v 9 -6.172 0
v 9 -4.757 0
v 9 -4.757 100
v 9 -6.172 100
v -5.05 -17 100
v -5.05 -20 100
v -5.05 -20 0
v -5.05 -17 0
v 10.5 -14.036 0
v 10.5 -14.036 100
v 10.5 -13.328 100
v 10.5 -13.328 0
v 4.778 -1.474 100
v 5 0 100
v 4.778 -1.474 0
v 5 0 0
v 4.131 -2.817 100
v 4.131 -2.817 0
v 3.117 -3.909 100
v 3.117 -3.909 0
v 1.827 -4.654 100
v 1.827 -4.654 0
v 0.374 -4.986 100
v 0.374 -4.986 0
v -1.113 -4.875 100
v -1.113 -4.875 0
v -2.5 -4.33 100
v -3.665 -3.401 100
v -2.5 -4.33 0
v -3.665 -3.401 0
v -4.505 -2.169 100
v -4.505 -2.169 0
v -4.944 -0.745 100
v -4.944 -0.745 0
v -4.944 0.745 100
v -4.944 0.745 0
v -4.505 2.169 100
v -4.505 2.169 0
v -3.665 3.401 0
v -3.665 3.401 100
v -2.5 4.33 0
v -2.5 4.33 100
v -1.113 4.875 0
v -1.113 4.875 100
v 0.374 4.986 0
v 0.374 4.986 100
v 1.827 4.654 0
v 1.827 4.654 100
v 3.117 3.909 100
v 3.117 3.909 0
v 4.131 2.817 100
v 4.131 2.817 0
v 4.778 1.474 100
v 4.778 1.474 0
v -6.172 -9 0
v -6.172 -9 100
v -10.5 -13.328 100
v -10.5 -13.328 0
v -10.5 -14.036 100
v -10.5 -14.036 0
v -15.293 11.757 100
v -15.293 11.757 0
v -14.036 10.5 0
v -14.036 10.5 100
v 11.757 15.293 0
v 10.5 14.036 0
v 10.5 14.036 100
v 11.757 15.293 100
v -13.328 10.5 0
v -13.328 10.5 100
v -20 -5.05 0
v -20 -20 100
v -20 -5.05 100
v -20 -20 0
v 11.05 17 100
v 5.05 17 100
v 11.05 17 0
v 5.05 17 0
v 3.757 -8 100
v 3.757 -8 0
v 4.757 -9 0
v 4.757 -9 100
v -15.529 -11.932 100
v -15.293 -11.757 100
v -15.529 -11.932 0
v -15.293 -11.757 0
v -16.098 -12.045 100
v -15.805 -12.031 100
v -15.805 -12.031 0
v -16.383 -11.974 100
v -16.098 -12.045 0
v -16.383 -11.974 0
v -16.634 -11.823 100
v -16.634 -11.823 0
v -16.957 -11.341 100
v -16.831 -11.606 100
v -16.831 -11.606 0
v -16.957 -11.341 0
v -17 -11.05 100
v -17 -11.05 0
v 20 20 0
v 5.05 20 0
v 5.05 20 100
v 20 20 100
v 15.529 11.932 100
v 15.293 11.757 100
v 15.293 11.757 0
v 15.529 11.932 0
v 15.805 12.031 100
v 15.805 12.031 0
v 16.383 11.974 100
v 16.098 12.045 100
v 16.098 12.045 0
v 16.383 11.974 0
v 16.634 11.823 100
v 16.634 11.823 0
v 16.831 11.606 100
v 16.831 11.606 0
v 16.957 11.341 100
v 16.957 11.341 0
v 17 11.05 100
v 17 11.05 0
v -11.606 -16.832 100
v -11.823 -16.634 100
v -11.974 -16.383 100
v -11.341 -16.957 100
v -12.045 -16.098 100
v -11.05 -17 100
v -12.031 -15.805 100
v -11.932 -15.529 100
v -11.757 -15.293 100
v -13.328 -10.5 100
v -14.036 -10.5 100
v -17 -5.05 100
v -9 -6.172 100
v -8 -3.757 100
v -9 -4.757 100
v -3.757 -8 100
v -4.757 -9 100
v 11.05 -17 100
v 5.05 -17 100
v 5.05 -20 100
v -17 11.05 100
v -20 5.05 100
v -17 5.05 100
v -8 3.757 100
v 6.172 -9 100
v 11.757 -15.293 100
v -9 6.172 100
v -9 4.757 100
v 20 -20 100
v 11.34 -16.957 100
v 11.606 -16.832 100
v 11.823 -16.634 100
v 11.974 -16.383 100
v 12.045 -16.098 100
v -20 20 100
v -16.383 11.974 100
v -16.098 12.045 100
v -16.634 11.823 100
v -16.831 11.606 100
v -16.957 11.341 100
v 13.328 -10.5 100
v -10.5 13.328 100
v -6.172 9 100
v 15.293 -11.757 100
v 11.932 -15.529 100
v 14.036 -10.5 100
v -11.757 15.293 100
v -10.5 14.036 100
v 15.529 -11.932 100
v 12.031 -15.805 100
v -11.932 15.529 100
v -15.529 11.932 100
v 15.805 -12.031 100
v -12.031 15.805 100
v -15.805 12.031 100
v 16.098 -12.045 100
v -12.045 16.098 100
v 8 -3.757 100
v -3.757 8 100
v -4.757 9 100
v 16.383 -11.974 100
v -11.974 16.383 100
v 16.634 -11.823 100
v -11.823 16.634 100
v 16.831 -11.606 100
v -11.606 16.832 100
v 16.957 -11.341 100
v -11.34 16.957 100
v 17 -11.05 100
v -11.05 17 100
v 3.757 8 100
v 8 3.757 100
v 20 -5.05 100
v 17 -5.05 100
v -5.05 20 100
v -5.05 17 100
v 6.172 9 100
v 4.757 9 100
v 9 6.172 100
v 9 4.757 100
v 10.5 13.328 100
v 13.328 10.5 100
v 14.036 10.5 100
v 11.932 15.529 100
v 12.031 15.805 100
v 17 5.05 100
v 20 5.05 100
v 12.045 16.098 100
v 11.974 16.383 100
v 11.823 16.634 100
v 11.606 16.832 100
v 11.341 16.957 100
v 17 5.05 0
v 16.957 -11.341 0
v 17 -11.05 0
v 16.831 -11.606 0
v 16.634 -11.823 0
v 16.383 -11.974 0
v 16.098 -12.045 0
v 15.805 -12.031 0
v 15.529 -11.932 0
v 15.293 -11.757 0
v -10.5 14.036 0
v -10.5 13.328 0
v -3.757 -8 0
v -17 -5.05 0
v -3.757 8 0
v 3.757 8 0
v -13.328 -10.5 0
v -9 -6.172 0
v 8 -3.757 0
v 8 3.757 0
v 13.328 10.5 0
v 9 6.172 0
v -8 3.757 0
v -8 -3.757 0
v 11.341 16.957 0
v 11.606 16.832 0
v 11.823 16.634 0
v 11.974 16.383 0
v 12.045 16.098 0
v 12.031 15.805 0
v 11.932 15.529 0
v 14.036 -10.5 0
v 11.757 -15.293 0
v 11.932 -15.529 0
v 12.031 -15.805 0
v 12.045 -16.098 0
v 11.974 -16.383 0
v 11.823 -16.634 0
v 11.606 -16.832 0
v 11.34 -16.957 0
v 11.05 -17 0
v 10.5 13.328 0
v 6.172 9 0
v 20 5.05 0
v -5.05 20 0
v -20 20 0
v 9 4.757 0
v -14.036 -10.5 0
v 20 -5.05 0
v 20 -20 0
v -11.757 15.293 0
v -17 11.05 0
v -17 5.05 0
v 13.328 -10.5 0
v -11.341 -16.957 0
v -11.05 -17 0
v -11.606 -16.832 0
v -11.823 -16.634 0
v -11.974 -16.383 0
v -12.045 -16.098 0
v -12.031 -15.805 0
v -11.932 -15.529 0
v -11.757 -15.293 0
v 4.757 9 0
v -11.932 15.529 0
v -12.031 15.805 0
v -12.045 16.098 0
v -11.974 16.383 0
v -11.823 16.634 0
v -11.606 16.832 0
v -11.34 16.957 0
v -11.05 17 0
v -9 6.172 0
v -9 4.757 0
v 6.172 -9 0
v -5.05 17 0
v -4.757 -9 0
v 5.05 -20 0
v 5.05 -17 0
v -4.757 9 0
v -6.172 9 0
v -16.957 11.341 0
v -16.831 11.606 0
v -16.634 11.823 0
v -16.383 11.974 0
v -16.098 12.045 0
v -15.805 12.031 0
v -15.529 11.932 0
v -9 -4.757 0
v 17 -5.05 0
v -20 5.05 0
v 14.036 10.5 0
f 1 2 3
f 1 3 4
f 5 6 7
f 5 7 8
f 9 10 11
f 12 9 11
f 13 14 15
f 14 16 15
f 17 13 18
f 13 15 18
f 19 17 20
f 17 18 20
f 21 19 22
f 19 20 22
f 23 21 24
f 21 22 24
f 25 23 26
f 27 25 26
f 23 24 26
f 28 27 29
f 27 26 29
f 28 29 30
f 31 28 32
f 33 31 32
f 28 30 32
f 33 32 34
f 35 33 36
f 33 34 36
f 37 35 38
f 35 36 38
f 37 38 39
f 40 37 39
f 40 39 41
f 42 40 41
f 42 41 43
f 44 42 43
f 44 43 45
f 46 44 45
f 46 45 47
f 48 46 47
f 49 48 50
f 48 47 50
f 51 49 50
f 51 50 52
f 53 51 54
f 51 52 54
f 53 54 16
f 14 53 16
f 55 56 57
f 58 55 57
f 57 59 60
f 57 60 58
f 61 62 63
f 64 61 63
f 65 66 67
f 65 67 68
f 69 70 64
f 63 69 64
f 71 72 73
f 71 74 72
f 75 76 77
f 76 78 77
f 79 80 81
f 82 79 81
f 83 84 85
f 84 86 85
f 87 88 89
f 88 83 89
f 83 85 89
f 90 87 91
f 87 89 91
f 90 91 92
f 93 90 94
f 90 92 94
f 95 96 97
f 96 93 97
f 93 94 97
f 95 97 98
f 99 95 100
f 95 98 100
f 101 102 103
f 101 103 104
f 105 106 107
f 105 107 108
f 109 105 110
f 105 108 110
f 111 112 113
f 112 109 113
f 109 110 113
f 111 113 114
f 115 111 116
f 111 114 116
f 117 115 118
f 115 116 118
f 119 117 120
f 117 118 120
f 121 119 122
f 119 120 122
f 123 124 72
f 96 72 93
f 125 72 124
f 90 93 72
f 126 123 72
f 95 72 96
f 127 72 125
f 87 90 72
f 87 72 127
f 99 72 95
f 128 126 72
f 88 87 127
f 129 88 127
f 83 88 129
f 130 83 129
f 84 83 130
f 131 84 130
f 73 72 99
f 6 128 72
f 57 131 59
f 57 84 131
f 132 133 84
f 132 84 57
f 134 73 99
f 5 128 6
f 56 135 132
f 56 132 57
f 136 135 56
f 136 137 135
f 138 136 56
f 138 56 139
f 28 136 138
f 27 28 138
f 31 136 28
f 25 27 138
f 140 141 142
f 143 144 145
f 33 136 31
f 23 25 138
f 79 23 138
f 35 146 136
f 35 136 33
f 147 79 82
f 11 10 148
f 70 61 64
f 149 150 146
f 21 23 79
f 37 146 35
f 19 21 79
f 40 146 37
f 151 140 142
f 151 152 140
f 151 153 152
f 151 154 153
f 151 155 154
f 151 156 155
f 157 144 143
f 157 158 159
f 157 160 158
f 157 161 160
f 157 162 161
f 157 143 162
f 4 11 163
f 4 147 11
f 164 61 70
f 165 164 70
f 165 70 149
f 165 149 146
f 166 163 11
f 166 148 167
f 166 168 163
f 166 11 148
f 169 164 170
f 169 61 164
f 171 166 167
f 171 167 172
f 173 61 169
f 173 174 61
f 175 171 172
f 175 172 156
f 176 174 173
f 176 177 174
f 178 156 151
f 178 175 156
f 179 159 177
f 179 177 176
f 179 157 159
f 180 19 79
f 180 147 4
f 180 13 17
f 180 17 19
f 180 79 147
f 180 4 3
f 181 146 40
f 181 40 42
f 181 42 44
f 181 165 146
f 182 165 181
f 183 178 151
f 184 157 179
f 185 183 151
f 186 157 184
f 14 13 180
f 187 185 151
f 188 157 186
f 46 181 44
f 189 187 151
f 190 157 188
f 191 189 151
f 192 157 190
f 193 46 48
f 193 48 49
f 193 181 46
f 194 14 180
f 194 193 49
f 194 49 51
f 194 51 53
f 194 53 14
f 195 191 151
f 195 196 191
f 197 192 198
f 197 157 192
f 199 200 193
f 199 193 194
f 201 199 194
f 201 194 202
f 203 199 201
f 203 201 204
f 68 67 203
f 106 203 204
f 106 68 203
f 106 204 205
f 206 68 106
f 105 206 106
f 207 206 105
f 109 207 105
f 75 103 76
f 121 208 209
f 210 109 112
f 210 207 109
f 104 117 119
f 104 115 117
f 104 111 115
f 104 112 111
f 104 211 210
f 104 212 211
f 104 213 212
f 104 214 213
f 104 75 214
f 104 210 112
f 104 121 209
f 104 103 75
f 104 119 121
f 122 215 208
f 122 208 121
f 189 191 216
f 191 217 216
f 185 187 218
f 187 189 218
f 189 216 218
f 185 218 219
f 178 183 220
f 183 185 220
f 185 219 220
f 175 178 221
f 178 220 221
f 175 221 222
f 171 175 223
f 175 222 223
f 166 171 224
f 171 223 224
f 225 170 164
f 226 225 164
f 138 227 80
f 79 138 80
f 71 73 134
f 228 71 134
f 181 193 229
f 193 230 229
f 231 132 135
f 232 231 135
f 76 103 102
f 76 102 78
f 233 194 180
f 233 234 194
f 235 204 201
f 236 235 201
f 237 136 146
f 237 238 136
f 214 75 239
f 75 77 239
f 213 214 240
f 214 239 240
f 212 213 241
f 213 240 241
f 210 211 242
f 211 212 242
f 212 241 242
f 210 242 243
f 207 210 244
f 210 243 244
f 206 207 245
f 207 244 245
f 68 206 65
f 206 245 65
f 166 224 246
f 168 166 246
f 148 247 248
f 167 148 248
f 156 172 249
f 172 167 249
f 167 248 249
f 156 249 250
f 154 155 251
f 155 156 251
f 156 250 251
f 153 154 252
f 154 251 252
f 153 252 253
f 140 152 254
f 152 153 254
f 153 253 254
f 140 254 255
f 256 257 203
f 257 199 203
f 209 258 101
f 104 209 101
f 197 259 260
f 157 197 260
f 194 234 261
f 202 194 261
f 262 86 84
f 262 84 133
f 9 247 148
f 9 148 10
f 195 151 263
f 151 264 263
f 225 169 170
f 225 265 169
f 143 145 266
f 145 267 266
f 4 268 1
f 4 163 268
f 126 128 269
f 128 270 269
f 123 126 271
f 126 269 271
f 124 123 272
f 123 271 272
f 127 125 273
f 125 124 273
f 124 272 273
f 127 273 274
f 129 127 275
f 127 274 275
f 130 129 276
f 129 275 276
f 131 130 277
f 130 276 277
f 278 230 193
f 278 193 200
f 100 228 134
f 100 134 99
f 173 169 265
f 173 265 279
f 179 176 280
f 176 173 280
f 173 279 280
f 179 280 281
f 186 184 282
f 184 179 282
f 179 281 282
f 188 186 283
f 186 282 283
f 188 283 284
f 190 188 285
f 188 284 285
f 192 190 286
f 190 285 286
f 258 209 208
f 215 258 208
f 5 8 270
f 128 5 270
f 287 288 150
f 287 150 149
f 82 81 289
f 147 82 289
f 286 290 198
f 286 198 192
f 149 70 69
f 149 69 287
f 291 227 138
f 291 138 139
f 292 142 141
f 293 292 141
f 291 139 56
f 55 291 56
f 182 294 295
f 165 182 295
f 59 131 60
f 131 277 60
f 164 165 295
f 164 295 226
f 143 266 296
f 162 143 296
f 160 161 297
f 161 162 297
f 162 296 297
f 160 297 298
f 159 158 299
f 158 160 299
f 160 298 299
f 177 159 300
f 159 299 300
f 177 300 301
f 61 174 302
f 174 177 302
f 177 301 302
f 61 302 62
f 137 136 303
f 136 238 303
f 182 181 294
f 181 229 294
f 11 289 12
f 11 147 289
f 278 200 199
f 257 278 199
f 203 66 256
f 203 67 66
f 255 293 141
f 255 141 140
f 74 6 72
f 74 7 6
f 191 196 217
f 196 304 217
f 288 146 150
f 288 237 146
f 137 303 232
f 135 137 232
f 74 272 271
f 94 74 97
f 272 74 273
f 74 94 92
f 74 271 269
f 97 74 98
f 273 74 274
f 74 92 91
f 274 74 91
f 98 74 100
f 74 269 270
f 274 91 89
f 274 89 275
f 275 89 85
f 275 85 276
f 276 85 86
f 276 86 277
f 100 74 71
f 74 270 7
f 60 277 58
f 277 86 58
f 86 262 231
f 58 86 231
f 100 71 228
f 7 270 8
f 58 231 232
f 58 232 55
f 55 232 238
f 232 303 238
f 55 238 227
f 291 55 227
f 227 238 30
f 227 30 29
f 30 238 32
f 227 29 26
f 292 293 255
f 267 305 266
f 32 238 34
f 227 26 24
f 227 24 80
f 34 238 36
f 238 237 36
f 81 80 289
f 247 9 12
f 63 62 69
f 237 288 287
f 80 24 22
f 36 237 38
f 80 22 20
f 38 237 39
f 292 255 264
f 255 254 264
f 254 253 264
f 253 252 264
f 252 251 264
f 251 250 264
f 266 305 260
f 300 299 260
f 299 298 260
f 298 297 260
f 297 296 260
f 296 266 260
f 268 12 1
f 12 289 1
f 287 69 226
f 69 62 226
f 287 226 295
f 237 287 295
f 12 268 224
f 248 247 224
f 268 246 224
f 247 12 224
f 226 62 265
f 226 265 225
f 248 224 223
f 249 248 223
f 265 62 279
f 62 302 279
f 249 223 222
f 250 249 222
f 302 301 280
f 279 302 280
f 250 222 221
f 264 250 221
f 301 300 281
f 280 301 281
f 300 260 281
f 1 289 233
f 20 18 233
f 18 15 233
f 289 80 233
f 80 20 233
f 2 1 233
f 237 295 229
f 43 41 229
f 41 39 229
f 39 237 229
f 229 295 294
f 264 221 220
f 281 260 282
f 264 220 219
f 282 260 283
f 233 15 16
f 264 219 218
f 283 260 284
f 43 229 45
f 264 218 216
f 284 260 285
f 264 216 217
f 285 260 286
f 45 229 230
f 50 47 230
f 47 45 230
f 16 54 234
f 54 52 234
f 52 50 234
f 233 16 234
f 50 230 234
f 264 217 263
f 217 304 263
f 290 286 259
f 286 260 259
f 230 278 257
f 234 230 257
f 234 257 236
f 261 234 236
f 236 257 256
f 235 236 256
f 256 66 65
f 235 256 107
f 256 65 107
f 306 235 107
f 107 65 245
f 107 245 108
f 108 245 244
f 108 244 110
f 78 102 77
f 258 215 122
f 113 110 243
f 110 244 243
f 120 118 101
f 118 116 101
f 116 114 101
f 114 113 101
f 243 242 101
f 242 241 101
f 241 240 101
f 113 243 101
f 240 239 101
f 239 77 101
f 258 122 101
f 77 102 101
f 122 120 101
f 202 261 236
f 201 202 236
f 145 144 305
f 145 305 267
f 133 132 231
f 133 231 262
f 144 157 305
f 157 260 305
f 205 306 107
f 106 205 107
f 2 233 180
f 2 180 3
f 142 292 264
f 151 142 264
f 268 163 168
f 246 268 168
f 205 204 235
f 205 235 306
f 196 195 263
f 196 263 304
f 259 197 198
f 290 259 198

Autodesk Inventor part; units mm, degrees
ref_plane "YZ Plane" through (0, 0, 0) normal (1, 0, 0) x (0, 1, 0)
ref_plane "XZ Plane" through (0, 0, 0) normal (0, 1, 0) x (-1, 0, 0)
ref_plane "XY Plane" through (0, 0, 0) normal (0, 0, 1) x (1, 0, 0)
sketch "Sketch1" plane through (0, 0, 0) normal (0, 0, 1) x (1, 0, 0)
  arc A0 (0, 5) -> (-5, 0) centre (0, 0) ccw
  line L0 (-5.05, 20.0001) -> (-20, 20.0001)
  line L1 (-20, 20.0001) -> (-20, 5.0501)
  line L2 (-20, 5.0501) -> (-17, 5.0501)
  line L3 (-5.05, 20.0001) -> (-5.05, 17.0001)
  line L4 (0, 8) -> (-3.7572, 8)
  line L5 (-8, 3.7574) -> (-8, 0)
  arc A1 (-15.2929, 11.7574) -> (-17, 11.0503) centre (-16, 11.0503) ccw
  arc A2 (-11.0502, 17.0001) -> (-11.7573, 15.2929) centre (-11.0502, 16.0001) ccw
  line L6 (-17, 5.0501) -> (-17, 11.0503)
  line L7 (-5.05, 17.0001) -> (-11.0502, 17.0001)
  line L8 (-11.7573, 15.2929) -> (-5.4644, 9)
  line L9 (-15.2929, 11.7574) -> (-9, 5.4645)
  line L10 (0, 0) -> (-41.3511, 0) construction
  arc A3 (-5, 0) -> (0, -5) centre (0, 0) ccw
  line L11 (-5.05, -20.0001) -> (-20, -20.0001)
  line L12 (-20, -20.0001) -> (-20, -5.0501)
  line L13 (-20, -5.0501) -> (-17, -5.0501)
  line L14 (-5.05, -20.0001) -> (-5.05, -17.0001)
  line L15 (0, -8) -> (-3.7572, -8)
  line L16 (-8, -3.7574) -> (-8, 0)
  arc A4 (-17, -11.0503) -> (-15.2929, -11.7574) centre (-16, -11.0503) ccw
  arc A5 (-11.7573, -15.2929) -> (-11.0502, -17.0001) centre (-11.0502, -16.0001) ccw
  line L17 (-17, -5.0501) -> (-17, -11.0503)
  line L18 (-5.05, -17.0001) -> (-11.0502, -17.0001)
  line L19 (-11.7573, -15.2929) -> (-5.4644, -9)
  line L20 (-15.2929, -11.7574) -> (-9, -5.4645)
  line L21 (0, 26.9899) -> (0, -26.9183) construction
  arc A6 (0, -5) -> (5, 0) centre (0, 0) ccw
  line L22 (8, -3.7574) -> (8, 0)
  line L23 (15.2929, -11.7574) -> (9, -5.4645)
  line L24 (11.7573, -15.2929) -> (5.4644, -9)
  line L25 (0, -8) -> (3.7572, -8)
  line L26 (5.05, -17.0001) -> (11.0502, -17.0001)
  arc A7 (11.0502, -17.0001) -> (11.7573, -15.2929) centre (11.0502, -16.0001) ccw
  line L27 (5.05, -20.0001) -> (5.05, -17.0001)
  line L28 (5.05, -20.0001) -> (20, -20.0001)
  line L29 (20, -20.0001) -> (20, -5.0501)
  line L30 (20, -5.0501) -> (17, -5.0501)
  line L31 (17, -5.0501) -> (17, -11.0503)
  arc A8 (15.2929, -11.7574) -> (17, -11.0503) centre (16, -11.0503) ccw
  arc A9 (5, 0) -> (0, 5) centre (0, 0) ccw
  line L32 (20, 5.0501) -> (20, 20.0001)
  line L33 (5.05, 20.0001) -> (20, 20.0001)
  line L34 (5.05, 20.0001) -> (5.05, 17.0001)
  line L35 (20, 5.0501) -> (17, 5.0501)
  line L36 (5.4644, 9) -> (11.7573, 15.2929)
  line L37 (9, 5.4645) -> (15.2929, 11.7574)
  line L38 (5.05, 17.0001) -> (11.0502, 17.0001)
  line L39 (17, 5.0501) -> (17, 11.0503)
  arc A10 (11.7573, 15.2929) -> (11.0502, 17.0001) centre (11.0502, 16.0001) ccw
  arc A11 (17, 11.0503) -> (15.2929, 11.7574) centre (16, 11.0503) ccw
  line L40 (-3.7572, 8) -> (-4.7572, 9)
  line L41 (-8, 3.7574) -> (-9, 4.7574)
  line L42 (-9, 4.7574) -> (-9, 5.4645)
  line L43 (-4.7572, 9) -> (-5.4644, 9)
  line L44 (-3.7572, -8) -> (-4.7572, -9)
  line L45 (-8, -3.7574) -> (-9, -4.7574)
  line L46 (-9, -4.7574) -> (-9, -5.4645)
  line L47 (-4.7572, -9) -> (-5.4644, -9)
  line L48 (3.7572, 8) -> (4.7572, 9)
  line L49 (8, 3.7574) -> (9, 4.7574)
  line L50 (9, 4.7574) -> (9, 5.4645)
  line L51 (4.7572, 9) -> (5.4644, 9)
  line L52 (8, -3.7574) -> (9, -4.7574)
  line L53 (9, -4.7574) -> (9, -5.4645)
  line L54 (4.7572, -9) -> (5.4644, -9)
  line L55 (3.7572, -8) -> (4.7572, -9)
  line L56 (0, 8) -> (3.7572, 8)
  line L57 (8, 3.7574) -> (8, 0)
  point P0 (-4.4644, 8)
  point P1 (-8, 4.4645)
  dimension "d0" = 10
  dimension "d3" = 14.95
  dimension "d4" = 14.95
  dimension "d5" = 3
  dimension "d7" = 2
  dimension "d8" = 4
  dimension "d9" = 4
  dimension "d10" = 8.9498
  dimension "d11" = 8.9498
  dimension "d12" = 45
  dimension "d16" = 8
  dimension "d18" = 2.5
  dimension "d19" = 20
  dimension "d21" = 1
  dimension "d24" = 0.5
  dimension "d25" = 0.5
  dimension "d26" = 1
  dimension "d34" = 8
extrude "MK, 40X40" add sketch "Sketch1" along normal blind 100
sketch "Sketch2" plane through (0, 0, 100) normal (0, 0, 1) x (1, 0, 0)
  circle A0 centre (0, 0) radius 5 projected
  line L0 (-9, 5.4645) -> (-15.2929, 11.7574) projected
  line L1 (-11.7573, 15.2929) -> (-5.4644, 9) projected
  line L2 (-13.3283, 10.5) -> (-9, 6.1717)
  line L3 (-6.1715, 9) -> (-10.5, 13.3285)
  line L4 (-5.4644, 9) -> (-6.1715, 9)
  line L5 (-5.4644, 9) -> (-4.7572, 9) projected
  line L6 (-9, 5.4645) -> (-9, 6.1717)
  line L7 (-10.5, 14.0356) -> (-10.5, 13.3285)
  line L8 (-13.3283, 10.5) -> (-14.0355, 10.5)
  line L9 (0, 0) -> (-37.9325, 0) construction
  line L10 (0, 26.9937) -> (0, -28.1119) construction
  line L11 (-13.3283, -10.5) -> (-9, -6.1717)
  line L12 (-6.1715, -9) -> (-10.5, -13.3285)
  line L13 (-5.4644, -9) -> (-6.1715, -9)
  line L14 (-9, -5.4645) -> (-9, -6.1717)
  line L15 (-10.5, -14.0356) -> (-10.5, -13.3285)
  line L16 (-13.3283, -10.5) -> (-14.0355, -10.5)
  line L17 (13.3283, 10.5) -> (9, 6.1717)
  line L18 (6.1715, 9) -> (10.5, 13.3285)
  line L19 (5.4644, 9) -> (6.1715, 9)
  line L20 (9, 5.4645) -> (9, 6.1717)
  line L21 (10.5, 14.0356) -> (10.5, 13.3285)
  line L22 (13.3283, 10.5) -> (14.0355, 10.5)
  line L23 (13.3283, -10.5) -> (14.0355, -10.5)
  line L24 (13.3283, -10.5) -> (9, -6.1717)
  line L25 (9, -5.4645) -> (9, -6.1717)
  line L26 (5.4644, -9) -> (6.1715, -9)
  line L27 (6.1715, -9) -> (10.5, -13.3285)
  line L28 (10.5, -14.0356) -> (10.5, -13.3285)
  line L29 (-14.0355, -10.5) -> (-9, -5.4645)
  line L30 (-15.2929, -11.7574) -> (-9, -5.4645) projected
  line L31 (-5.4644, -9) -> (-10.5, -14.0356)
  line L32 (-5.4644, -9) -> (-11.7573, -15.2929) projected
  line L33 (10.5, -14.0356) -> (5.4644, -9)
  line L34 (14.0355, -10.5) -> (9, -5.4645)
  line L35 (9, 5.4645) -> (14.0355, 10.5)
  line L36 (10.5, 14.0356) -> (5.4644, 9)
  dimension "d28" = 4
  dimension "d29" = 0.5
  dimension "d30" = 10.5
  dimension "d31" = 10.5
extrude "Extrusion2" cut sketch "Sketch2" against normal through all contours L0 L8 L2 L6 | L1 L4 L3 L7 | L16 L29 L14 L11 | L13 L31 L15 L12 | L22 L35 L20 L17 | L19 L36 L21 L18 | L24 L25 L34 L23 | L26 L27 L28 L33
equation "\"d4\" = d3"
properties part number "BAR, EXTRUDED ALUM, 40MMX40MM, MK, STD DUTY, 54_01 SERIES" material "Aluminum, 6061-T6"
